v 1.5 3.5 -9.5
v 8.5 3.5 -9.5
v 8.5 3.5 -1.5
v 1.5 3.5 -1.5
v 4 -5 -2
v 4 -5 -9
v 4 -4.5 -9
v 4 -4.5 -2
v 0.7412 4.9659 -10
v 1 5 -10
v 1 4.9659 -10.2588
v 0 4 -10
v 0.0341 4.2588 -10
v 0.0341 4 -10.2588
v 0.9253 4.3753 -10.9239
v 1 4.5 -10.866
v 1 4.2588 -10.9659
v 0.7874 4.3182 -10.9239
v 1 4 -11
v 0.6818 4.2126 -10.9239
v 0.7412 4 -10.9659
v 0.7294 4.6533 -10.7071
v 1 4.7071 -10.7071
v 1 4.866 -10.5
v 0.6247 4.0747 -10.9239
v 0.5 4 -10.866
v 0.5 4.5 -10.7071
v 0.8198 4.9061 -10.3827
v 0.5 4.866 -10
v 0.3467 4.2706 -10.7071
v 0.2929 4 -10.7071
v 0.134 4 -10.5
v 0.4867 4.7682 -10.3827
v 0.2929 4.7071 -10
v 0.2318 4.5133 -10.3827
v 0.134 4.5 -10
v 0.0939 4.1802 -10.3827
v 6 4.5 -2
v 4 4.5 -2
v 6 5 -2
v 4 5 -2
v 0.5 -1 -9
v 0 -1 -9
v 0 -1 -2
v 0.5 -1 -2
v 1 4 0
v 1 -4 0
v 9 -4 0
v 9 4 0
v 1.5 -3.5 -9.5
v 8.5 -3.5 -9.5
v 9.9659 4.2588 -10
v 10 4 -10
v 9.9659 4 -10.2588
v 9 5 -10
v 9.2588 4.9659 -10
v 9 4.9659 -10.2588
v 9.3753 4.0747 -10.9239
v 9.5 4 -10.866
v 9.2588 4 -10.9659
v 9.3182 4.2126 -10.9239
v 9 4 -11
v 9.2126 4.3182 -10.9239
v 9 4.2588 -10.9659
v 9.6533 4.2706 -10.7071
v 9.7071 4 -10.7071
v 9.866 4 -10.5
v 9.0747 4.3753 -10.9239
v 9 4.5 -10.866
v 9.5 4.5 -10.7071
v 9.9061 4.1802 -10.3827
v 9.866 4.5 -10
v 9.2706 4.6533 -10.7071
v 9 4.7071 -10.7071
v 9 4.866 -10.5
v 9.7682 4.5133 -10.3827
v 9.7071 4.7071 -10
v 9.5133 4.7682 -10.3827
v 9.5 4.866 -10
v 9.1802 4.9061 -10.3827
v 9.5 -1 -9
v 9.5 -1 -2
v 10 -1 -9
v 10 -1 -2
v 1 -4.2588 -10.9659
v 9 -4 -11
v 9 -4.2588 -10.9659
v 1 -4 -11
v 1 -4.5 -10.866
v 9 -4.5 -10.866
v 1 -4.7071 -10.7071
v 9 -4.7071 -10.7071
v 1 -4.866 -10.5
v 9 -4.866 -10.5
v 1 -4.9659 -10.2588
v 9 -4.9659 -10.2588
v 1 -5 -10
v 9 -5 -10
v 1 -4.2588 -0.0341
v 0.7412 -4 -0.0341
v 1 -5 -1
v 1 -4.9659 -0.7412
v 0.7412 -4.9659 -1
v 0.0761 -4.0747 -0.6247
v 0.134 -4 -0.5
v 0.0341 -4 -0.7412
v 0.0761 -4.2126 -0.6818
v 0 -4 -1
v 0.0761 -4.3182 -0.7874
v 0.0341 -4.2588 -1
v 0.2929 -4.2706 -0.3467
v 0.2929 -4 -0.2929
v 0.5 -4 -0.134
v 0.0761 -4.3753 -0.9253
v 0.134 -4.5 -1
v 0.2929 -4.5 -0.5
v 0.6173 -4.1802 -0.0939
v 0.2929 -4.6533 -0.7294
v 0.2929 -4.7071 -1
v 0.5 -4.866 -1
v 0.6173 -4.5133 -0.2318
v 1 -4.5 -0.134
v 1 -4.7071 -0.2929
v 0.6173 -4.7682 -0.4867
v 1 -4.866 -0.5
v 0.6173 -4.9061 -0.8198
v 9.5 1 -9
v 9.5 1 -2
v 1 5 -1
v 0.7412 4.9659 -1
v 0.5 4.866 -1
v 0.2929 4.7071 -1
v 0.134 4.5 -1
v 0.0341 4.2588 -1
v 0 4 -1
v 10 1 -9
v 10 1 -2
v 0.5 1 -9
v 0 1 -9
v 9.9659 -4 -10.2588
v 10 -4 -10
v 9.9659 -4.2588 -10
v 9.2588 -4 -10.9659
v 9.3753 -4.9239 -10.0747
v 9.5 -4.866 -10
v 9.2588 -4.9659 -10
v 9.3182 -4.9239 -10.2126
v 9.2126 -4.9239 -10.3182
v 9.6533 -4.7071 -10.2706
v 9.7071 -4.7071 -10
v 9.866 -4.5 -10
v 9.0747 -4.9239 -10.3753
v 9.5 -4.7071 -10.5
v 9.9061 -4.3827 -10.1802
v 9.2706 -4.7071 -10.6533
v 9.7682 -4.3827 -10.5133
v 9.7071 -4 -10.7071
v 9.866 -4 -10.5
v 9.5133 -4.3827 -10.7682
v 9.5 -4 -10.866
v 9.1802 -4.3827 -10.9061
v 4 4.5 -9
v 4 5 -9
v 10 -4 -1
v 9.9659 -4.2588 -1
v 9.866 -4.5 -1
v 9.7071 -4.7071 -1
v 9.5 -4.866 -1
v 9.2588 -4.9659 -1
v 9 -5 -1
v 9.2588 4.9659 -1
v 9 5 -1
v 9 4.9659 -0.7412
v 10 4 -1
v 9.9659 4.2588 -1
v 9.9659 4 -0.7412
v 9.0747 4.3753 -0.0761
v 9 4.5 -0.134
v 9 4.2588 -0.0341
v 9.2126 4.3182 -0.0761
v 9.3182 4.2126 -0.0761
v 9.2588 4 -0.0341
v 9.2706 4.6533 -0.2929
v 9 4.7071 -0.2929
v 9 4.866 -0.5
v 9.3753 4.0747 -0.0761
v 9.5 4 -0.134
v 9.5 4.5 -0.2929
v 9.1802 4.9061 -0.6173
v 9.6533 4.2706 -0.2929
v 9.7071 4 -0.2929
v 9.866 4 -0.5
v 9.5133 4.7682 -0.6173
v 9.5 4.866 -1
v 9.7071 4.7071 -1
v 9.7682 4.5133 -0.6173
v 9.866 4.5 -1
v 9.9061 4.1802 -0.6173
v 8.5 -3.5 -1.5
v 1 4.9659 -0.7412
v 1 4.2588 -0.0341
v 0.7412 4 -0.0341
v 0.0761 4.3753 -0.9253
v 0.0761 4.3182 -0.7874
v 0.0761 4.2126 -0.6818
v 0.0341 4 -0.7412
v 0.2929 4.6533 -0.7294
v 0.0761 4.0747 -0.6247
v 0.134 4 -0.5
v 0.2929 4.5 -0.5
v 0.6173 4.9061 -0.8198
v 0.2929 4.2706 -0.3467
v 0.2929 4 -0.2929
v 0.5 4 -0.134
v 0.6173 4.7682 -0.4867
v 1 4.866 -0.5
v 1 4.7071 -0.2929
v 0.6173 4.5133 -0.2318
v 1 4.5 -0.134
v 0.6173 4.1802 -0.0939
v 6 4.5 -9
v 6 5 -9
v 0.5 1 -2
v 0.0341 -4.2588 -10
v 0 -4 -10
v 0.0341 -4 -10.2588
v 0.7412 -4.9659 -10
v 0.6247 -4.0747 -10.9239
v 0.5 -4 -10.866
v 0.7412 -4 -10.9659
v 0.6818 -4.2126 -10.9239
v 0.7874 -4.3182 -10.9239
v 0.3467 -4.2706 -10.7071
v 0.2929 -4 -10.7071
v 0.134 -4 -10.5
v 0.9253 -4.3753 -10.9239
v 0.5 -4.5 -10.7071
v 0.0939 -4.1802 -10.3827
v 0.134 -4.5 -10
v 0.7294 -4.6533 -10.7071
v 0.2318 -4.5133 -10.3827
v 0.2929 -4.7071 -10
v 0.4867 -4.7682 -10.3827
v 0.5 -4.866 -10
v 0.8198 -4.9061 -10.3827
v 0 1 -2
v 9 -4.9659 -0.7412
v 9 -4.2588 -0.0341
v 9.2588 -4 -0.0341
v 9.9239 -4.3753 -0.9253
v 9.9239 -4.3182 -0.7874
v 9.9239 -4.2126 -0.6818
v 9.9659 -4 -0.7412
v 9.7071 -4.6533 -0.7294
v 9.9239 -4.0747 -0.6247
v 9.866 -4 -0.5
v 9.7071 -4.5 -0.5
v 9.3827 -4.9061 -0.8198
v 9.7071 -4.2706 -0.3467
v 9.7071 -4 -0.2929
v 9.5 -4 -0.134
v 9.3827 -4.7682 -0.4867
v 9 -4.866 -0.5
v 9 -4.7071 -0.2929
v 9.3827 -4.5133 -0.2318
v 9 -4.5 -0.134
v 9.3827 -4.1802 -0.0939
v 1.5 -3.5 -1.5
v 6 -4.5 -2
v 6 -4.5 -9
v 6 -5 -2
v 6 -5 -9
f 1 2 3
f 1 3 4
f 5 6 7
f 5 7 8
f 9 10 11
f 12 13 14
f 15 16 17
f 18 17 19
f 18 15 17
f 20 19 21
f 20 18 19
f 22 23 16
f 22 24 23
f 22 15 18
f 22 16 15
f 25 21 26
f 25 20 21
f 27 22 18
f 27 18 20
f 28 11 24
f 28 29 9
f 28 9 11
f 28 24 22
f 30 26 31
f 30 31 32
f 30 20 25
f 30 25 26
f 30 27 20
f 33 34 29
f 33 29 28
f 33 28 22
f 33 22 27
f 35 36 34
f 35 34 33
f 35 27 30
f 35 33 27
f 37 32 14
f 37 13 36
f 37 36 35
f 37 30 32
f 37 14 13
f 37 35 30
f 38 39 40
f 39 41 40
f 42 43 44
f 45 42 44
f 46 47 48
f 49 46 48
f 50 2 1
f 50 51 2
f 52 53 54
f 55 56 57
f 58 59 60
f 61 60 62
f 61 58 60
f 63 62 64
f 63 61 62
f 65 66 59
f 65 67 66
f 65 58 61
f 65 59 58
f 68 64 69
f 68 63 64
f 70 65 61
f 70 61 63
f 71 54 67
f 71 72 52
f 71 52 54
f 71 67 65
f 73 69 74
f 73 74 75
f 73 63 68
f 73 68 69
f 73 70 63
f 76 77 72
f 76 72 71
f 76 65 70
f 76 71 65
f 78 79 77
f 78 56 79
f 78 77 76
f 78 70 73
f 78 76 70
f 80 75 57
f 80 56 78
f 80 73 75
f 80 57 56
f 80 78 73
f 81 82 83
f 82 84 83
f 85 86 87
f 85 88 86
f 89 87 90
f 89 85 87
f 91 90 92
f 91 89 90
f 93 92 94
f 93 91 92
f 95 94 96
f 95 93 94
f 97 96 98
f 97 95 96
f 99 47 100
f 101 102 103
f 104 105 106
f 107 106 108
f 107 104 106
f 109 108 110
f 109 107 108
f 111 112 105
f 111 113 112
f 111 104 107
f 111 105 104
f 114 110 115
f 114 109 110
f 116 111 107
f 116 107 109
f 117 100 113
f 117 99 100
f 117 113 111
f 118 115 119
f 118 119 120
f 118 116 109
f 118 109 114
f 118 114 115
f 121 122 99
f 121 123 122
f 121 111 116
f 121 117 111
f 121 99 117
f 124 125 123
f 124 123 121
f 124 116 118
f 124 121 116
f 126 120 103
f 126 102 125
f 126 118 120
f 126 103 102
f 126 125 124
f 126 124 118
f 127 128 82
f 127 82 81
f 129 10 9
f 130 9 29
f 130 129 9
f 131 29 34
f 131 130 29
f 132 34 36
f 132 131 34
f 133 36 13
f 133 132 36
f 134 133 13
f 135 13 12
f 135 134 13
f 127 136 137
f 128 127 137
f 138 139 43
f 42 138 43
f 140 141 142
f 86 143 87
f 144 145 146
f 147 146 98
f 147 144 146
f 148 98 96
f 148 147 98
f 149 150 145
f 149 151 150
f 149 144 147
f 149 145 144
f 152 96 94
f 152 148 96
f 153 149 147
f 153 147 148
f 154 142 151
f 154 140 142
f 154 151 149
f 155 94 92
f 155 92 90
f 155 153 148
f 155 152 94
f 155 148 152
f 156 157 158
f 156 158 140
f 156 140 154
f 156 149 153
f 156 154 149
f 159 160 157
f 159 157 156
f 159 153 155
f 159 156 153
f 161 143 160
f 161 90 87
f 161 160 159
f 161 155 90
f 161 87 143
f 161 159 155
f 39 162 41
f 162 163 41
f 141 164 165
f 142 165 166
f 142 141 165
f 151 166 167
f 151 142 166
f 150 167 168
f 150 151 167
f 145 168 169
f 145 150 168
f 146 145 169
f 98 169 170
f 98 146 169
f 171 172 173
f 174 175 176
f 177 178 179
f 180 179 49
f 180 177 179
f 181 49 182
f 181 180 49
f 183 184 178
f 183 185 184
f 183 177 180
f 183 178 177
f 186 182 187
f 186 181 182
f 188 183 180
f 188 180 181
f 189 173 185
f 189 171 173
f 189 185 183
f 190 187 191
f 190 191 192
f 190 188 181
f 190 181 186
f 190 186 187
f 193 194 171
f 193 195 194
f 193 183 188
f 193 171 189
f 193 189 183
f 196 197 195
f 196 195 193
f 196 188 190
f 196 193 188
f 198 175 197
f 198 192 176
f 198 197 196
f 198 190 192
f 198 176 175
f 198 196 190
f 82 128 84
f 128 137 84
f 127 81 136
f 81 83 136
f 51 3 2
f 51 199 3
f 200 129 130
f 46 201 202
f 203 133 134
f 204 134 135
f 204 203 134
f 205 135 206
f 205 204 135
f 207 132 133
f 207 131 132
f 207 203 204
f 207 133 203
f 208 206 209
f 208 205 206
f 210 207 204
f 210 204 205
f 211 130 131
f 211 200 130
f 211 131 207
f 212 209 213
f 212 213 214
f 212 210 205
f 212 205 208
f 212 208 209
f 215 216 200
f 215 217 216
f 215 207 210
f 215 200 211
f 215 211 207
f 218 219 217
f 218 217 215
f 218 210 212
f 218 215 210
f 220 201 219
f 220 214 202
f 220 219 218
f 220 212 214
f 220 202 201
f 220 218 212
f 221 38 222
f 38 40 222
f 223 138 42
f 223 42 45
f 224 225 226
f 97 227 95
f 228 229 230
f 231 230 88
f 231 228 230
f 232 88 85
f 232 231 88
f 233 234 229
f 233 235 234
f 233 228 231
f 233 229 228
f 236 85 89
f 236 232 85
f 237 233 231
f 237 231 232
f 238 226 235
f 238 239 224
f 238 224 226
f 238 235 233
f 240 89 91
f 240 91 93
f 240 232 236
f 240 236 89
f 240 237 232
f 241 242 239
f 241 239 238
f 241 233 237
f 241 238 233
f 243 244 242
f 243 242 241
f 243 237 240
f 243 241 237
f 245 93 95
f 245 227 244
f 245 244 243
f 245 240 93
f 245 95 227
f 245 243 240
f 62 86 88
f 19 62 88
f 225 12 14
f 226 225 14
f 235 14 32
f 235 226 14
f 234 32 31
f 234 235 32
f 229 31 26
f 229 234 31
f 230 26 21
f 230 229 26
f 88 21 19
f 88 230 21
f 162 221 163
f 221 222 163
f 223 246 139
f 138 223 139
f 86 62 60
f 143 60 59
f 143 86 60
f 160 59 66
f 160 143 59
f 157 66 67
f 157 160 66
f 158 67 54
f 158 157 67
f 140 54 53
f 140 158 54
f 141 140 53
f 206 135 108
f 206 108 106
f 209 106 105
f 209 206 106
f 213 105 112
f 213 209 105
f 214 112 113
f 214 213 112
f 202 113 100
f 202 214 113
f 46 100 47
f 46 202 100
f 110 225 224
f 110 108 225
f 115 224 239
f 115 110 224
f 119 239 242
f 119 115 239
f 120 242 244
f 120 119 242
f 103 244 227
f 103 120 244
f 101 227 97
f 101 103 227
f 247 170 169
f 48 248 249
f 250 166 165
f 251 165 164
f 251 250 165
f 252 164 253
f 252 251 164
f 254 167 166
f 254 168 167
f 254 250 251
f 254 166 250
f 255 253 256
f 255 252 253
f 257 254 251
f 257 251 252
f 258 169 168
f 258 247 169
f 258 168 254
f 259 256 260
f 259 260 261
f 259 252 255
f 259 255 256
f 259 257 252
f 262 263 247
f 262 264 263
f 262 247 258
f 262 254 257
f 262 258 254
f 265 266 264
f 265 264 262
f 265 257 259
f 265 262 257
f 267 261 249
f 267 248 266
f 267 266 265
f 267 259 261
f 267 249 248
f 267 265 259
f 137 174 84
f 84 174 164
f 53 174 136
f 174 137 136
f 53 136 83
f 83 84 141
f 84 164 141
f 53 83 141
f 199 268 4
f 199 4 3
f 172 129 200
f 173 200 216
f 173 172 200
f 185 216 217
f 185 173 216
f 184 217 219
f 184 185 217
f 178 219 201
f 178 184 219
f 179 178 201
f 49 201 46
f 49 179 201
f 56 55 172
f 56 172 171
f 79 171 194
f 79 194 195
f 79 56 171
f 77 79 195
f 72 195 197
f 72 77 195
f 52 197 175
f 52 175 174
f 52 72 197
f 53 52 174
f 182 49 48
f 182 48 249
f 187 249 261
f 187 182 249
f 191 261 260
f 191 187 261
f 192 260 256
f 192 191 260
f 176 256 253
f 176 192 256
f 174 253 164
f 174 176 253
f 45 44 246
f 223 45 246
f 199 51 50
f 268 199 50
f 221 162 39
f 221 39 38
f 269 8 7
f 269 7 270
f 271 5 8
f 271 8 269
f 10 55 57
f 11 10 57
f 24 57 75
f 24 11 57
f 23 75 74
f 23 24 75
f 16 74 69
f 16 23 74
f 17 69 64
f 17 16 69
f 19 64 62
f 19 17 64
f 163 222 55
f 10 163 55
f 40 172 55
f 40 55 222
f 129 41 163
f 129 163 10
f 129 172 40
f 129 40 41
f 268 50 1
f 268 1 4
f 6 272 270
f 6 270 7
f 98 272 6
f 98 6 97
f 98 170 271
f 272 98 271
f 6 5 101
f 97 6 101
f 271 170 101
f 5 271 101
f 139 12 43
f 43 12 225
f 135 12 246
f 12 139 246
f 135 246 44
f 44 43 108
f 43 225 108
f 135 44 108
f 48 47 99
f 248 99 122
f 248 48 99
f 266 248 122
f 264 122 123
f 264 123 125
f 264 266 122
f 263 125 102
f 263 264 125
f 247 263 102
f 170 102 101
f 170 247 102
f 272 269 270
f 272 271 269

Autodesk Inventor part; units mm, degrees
ref_plane "YZ Plane" through (0, 0, 0) normal (1, 0, 0) x (0, 1, 0)
ref_plane "XZ Plane" through (0, 0, 0) normal (0, 1, 0) x (-1, 0, 0)
ref_plane "XY Plane" through (0, 0, 0) normal (0, 0, 1) x (1, 0, 0)
sketch "Эскиз1" plane through (0, 0, 0) normal (0, 1, 0) x (-1, 0, 0)
  line L0 (0, 0) -> (-10, 0)
  line L1 (-10, 0) -> (-10, -11)
  line L2 (-10, -11) -> (0, -11)
  line L3 (0, -11) -> (0, 0)
  dimension "d0" = 10
  dimension "d1" = 11
extrude "Выдавливание1" add sketch "Эскиз1" along normal mid plane 10
sketch "Эскиз2" plane through (0, 0, 0) normal (0, 1, 0) x (-1, 0, 0)
  line L0 (0, -11) -> (0, 0) projected
  line L1 (0, -5.5) -> (-10, -5.5)
  line L2 (-10, 0) -> (-10, -11) projected
  line L3 (-1.5, -1.5) -> (-8.5, -1.5)
  line L4 (-8.5, -1.5) -> (-8.5, -9.5)
  line L5 (-8.5, -9.5) -> (-1.5, -9.5)
  line L6 (-1.5, -9.5) -> (-1.5, -1.5)
  line L7 (-1.5, -1.5) -> (-8.5, -9.5) construction
  line L8 (-8.5, -1.5) -> (-1.5, -9.5) construction
  point P0 (-5, -5.5)
  dimension "d4" = 7
  dimension "d5" = 8
extrude "Выдавливание2" cut sketch "Эскиз2" along normal mid plane 7
fillet "Сопряжение1" radius 1 12 edges at (10, 5, -5.5) (5, -5, 0) (5, 5, 0) (0, 5, -5.5) (0, 0, 0) (0, -5, -5.5) (0, 0, -11) (10, 0, -11) (5, 5, -11) (5, -5, -11) (10, -5, -5.5) (10, 0, 0)
sketch "Эскиз3" plane through (0, -4, -1) normal (-1, 0, 0) x (0, 0, 1)
  line L0 (0, 0) -> (0, 8) projected
  line L1 (0, 4) -> (-9, 4)
  line L2 (-9, 0) -> (-9, 8) projected
  line L3 (-1, 5) -> (-8, 5)
  line L4 (-8, 5) -> (-8, 3)
  line L5 (-8, 3) -> (-1, 3)
  line L6 (-1, 3) -> (-1, 5)
  line L7 (-1, 5) -> (-8, 3) construction
  line L8 (-8, 5) -> (-1, 3) construction
  point P0 (1, 4)
  point P1 (-4.5, 4)
sketch "Эскиз6" plane through (10, -4, -1) normal (1, 0, 0) x (0, 0, -1)
  line L0 (1, 3) -> (8, 3) projected
  line L1 (1, 5) -> (1, 3) projected
  line L2 (8, 5) -> (1, 5) projected
  line L3 (8, 3) -> (8, 5) projected
  point P0 (-1, 4)
sketch "Эскиз7" plane through (0, 5, 0) normal (0, 1, 0) x (1, 0, 0)
  line L0 (9, 1) -> (1, 1) projected
  line L1 (5, 1) -> (5, 10)
  line L2 (9, 10) -> (1, 10) projected
  line L3 (4, 2) -> (6, 2)
  line L4 (6, 2) -> (6, 9)
  line L5 (6, 9) -> (4, 9)
  line L6 (4, 9) -> (4, 2)
  line L7 (4, 2) -> (6, 9) construction
  line L8 (6, 2) -> (4, 9) construction
  point P0 (0, 0)
  point P1 (5, 5.5)
sketch "Эскиз8" plane through (0, -5, 0) normal (0, -1, 0) x (1, 0, 0)
  line L0 (4, -9) -> (4, -2) projected
  line L1 (6, -9) -> (4, -9) projected
  line L2 (6, -2) -> (6, -9) projected
  line L3 (4, -2) -> (6, -2) projected
  point P0 (0, 0)
extrude "Выдавливание5" cut sketch "Эскиз7" against normal blind 0.5
extrude "Выдавливание6" cut sketch "Эскиз3" against normal blind 0.5
extrude "Выдавливание7" cut sketch "Эскиз8" against normal blind 0.5
extrude "Выдавливание8" cut sketch "Эскиз6" against normal blind 0.5
properties part number "cube"
